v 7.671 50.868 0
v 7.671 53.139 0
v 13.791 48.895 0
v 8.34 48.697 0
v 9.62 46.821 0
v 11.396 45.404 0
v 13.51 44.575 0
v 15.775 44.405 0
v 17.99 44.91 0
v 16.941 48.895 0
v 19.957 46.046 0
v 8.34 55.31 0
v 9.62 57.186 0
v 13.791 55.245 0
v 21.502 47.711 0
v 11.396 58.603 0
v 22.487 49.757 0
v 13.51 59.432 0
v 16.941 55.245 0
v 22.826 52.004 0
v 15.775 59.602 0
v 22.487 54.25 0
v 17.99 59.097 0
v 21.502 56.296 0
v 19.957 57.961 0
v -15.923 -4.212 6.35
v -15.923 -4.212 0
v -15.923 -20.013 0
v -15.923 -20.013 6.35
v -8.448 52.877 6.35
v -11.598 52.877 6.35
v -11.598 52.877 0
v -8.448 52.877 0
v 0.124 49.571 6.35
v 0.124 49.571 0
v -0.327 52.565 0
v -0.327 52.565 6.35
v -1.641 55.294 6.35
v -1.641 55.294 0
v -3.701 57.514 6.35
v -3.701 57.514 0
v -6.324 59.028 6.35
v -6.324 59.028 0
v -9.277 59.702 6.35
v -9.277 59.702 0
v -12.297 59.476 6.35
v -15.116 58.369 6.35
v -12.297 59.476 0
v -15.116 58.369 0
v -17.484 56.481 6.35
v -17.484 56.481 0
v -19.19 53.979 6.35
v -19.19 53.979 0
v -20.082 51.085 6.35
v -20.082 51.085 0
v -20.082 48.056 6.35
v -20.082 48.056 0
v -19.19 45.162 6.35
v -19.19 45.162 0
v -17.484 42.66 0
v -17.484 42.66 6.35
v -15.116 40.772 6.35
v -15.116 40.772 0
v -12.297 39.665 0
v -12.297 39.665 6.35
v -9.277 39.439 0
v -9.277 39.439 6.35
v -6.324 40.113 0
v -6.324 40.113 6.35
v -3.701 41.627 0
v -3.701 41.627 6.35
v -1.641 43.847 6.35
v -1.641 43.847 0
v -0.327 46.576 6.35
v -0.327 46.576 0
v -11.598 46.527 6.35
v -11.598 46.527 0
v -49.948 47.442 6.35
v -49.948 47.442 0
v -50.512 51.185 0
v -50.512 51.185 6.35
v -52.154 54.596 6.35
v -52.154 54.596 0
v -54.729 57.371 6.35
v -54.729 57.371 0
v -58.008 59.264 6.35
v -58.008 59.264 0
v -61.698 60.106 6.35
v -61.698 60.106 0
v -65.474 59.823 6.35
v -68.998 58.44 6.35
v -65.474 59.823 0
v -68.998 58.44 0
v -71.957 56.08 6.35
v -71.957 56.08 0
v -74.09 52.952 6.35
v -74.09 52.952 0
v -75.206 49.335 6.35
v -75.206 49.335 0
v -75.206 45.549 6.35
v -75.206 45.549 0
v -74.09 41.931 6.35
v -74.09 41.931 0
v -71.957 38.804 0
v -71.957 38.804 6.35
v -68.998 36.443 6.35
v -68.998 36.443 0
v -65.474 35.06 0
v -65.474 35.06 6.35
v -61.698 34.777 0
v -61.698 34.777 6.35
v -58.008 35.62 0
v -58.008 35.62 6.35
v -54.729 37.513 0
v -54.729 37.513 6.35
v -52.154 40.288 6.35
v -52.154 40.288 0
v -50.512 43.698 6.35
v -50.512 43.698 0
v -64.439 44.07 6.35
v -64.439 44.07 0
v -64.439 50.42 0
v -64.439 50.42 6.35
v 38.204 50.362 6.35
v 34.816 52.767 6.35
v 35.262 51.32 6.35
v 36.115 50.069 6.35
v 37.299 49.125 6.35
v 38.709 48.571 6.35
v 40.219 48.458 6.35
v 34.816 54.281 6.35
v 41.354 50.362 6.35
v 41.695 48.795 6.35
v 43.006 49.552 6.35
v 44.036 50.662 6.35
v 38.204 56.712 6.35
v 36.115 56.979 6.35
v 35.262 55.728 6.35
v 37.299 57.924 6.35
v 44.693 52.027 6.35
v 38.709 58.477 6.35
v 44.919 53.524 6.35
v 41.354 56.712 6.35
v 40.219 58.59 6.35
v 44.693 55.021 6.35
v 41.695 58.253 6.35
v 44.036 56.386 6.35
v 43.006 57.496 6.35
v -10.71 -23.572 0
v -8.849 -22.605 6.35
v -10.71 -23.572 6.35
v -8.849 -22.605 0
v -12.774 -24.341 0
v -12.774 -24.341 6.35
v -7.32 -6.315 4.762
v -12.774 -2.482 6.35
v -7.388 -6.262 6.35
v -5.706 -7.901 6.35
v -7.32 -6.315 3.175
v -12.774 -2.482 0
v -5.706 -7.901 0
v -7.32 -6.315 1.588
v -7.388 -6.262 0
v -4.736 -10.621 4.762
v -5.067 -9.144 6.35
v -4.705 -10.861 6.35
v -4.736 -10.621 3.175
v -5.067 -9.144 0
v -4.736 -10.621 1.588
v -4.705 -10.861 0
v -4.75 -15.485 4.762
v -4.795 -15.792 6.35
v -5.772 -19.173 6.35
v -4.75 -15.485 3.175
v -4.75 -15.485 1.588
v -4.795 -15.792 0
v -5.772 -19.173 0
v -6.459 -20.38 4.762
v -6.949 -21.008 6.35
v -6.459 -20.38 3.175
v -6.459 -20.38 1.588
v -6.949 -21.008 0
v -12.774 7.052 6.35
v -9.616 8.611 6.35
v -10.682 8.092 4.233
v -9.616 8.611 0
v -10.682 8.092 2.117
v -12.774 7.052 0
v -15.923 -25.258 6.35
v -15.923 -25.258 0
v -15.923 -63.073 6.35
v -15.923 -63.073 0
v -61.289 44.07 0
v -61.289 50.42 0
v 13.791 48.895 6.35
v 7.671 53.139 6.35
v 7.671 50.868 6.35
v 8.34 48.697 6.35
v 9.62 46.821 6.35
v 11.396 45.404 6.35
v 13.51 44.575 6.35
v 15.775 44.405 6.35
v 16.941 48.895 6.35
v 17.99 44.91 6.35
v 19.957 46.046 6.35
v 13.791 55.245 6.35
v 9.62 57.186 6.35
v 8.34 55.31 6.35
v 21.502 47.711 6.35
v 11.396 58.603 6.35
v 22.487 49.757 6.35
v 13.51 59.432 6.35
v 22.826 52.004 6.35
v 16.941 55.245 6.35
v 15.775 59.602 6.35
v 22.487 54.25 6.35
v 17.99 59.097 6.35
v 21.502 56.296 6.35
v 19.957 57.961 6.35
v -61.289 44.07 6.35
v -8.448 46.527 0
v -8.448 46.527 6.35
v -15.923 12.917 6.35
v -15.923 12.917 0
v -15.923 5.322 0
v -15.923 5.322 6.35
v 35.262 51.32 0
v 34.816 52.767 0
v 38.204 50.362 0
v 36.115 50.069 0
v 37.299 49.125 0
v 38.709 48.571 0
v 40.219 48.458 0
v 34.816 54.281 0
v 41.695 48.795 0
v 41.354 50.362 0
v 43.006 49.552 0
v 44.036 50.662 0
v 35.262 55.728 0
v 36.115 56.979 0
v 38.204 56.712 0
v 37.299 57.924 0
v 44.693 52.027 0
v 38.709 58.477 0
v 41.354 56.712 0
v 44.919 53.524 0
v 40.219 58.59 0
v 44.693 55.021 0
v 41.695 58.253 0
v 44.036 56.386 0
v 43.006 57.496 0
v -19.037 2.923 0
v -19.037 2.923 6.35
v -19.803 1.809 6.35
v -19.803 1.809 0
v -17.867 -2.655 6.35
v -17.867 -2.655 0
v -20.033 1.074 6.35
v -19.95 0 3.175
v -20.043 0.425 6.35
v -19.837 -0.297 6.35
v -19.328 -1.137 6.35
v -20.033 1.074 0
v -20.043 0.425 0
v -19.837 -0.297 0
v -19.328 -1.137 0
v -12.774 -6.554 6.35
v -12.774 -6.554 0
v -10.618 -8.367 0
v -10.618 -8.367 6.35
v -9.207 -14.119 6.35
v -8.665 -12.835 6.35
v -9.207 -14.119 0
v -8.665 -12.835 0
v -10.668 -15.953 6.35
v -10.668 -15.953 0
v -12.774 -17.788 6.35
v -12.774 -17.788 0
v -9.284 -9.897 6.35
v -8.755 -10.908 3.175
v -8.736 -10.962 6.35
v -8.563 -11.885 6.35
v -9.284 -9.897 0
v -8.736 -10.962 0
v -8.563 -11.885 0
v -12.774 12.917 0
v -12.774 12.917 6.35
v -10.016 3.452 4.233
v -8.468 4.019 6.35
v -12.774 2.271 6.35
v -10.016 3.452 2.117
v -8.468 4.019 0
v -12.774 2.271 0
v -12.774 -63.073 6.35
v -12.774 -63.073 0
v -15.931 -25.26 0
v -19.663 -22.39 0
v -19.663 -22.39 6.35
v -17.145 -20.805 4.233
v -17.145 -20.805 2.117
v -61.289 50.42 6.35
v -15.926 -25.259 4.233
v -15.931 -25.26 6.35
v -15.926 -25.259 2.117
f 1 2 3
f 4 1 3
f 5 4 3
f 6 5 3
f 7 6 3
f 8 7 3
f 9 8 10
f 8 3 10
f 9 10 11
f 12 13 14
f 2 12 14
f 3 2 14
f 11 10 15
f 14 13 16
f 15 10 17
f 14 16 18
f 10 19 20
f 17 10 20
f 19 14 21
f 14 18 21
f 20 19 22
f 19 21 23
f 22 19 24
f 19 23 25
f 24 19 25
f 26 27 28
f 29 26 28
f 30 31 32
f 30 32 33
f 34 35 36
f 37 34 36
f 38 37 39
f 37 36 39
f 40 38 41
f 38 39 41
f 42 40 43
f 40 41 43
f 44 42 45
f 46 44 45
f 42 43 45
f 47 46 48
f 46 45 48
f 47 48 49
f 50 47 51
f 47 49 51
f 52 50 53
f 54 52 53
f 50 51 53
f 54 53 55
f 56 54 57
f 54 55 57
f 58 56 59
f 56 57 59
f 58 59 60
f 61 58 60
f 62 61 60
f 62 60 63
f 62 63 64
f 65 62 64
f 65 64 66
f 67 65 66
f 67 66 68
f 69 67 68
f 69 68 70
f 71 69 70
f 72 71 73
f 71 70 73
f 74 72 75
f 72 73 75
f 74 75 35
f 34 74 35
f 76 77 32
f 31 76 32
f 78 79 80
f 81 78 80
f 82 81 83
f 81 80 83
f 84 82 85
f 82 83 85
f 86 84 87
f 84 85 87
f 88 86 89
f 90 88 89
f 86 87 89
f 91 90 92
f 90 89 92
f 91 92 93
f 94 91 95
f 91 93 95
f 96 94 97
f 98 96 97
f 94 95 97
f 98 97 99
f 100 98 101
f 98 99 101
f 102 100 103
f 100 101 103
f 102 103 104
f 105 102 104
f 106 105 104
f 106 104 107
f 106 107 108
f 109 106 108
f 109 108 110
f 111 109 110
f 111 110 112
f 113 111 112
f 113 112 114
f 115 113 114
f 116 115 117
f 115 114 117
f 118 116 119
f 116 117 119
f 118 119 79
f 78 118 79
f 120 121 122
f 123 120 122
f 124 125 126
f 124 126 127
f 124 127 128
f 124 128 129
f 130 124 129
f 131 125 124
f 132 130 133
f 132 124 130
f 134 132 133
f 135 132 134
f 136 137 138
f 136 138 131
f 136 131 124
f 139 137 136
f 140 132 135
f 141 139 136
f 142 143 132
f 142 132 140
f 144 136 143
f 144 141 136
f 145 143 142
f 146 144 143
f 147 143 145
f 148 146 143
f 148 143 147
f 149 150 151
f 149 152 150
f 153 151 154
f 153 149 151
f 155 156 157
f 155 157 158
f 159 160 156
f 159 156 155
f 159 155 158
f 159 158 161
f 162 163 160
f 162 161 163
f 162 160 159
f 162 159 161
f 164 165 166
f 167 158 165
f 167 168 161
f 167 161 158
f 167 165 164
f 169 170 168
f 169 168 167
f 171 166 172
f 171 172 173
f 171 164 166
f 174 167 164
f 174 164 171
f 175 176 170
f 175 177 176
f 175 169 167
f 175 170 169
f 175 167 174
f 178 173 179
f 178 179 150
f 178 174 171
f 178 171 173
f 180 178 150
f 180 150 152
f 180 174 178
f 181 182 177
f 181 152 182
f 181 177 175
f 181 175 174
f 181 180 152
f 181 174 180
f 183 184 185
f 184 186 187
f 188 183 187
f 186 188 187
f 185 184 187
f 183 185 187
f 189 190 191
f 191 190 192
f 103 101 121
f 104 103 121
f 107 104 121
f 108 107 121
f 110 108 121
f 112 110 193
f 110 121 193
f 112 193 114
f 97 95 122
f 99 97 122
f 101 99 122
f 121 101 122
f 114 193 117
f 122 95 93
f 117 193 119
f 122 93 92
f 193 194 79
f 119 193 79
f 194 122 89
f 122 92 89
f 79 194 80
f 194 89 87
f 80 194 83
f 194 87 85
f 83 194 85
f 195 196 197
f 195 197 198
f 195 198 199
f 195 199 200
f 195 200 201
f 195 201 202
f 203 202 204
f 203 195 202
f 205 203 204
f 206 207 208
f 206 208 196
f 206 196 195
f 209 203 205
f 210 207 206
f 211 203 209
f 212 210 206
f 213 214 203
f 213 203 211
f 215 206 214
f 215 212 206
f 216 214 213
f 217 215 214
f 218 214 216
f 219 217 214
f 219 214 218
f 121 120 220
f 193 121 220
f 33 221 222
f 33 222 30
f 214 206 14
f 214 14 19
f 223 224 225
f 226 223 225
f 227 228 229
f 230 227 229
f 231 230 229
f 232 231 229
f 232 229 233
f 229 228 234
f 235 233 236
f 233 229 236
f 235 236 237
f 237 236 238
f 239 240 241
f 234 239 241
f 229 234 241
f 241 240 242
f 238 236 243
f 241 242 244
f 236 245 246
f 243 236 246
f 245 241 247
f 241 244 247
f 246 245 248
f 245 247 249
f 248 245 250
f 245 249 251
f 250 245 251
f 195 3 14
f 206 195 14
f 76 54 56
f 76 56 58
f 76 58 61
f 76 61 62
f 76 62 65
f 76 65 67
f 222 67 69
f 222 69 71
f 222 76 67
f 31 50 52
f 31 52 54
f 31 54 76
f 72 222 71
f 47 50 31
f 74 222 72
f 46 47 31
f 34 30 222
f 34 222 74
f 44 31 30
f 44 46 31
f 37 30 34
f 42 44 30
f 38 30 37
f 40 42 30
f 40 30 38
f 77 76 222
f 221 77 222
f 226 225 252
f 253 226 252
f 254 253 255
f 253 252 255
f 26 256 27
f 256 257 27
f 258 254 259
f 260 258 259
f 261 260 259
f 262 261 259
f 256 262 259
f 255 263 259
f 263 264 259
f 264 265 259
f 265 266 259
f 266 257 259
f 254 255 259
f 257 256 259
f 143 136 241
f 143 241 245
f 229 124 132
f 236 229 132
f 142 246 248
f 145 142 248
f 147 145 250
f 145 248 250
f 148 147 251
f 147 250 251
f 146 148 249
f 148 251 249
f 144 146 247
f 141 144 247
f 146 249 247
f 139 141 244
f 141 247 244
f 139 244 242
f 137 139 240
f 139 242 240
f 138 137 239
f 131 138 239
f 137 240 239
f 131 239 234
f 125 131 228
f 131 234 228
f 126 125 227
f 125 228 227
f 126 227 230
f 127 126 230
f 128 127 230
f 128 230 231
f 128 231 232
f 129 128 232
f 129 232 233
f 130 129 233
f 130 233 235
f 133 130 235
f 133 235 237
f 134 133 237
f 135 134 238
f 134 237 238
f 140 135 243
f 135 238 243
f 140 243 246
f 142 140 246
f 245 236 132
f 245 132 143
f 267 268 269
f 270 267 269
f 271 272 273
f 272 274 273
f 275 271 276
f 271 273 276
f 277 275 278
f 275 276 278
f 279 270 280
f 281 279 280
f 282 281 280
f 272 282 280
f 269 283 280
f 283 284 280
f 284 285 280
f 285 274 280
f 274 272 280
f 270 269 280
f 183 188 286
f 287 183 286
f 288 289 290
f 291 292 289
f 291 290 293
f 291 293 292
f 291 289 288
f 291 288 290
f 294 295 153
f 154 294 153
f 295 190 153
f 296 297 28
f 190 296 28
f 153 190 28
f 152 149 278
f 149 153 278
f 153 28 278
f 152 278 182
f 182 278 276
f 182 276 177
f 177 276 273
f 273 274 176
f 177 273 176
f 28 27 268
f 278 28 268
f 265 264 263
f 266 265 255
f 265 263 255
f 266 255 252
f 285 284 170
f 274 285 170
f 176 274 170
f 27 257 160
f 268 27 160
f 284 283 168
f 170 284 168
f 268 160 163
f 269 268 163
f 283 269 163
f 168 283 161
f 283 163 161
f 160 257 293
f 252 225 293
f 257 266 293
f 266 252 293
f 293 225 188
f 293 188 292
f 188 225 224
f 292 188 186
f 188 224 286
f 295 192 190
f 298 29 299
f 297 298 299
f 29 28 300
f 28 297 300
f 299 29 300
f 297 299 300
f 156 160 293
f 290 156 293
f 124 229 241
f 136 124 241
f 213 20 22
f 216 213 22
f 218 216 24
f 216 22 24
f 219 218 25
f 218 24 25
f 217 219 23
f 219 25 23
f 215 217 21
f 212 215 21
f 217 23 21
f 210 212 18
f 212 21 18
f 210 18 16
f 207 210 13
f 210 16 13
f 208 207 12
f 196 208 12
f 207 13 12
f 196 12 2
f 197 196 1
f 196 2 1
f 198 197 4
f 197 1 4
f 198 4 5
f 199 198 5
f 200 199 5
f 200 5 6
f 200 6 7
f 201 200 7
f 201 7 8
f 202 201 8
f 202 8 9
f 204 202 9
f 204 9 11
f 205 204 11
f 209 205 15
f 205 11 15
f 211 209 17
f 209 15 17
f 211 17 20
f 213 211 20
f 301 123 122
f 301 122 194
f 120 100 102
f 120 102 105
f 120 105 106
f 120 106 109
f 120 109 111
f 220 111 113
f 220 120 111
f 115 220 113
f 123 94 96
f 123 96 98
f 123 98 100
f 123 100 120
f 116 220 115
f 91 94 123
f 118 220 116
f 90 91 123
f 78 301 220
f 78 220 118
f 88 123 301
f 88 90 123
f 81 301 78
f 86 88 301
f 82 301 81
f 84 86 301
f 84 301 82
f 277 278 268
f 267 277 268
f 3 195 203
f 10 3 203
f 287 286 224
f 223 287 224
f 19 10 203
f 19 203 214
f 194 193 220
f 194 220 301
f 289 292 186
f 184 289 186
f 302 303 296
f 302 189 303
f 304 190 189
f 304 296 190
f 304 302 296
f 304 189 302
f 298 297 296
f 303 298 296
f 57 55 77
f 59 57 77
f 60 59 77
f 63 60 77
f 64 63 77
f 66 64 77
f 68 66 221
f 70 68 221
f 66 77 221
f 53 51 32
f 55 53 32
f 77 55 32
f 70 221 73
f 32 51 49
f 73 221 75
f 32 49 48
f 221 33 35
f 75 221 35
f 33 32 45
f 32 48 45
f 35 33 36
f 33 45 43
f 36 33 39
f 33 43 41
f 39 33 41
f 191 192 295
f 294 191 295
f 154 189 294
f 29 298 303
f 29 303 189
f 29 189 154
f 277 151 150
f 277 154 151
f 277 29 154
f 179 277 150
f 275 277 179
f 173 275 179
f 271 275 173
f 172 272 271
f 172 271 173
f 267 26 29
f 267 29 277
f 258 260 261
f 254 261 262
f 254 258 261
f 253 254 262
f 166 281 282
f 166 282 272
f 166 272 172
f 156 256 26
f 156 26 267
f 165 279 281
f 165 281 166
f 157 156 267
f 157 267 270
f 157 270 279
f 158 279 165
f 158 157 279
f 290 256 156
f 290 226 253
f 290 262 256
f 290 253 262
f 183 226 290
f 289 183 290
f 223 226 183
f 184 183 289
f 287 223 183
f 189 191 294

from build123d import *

# Parameters (mm, degrees)
F0_R     = 12.7
F1_DEPTH = 6.35
F0_R_2   = 10.16
F0_R_3   = 7.62
F0_R_4   = 5.08
F3_DEPTH = 6.35
F6_W     = 3.1496
F6_H     = 6.35
F5_W     = 3.1496
F5_H     = 6.35
F4_W     = 3.1496
F4_H     = 6.35
F8_DEPTH = 25.4
F7_W     = 3.1496
F7_H     = 6.35
F9_DEPTH = 6.35


with BuildPart() as f1:
    # F0 (on Top) → F1 (new body)
    with BuildSketch(Plane.XY):
        with Locations((-62.6475140452, 47.4418066442)):
            Circle(F0_R)
    extrude(amount=F1_DEPTH)

    # F7 (on face) → F9 (cut)
    with BuildSketch(Plane.XY.offset(6.35)):
        with Locations((-62.8639711767, 47.2454865665)):
            Rectangle(F7_W, F7_H)
    extrude(amount=-F9_DEPTH, mode=Mode.SUBTRACT)


with BuildPart() as f1b:
    # F0 (on Top) → F1, piece 2 (new body)
    with BuildSketch(Plane.XY):
        with Locations((-10.0357653573, 49.5706051588)):
            Circle(F0_R_2)
    extrude(amount=F1_DEPTH)


with BuildPart() as f1c:
    # F0 (on Top) → F1, piece 3 (new body)
    with BuildSketch(Plane.XY):
        with Locations((15.205710195, 52.0035177469)):
            Circle(F0_R_3)
    extrude(amount=F1_DEPTH)


with BuildPart() as f1d:
    # F0 (on Top) → F1, piece 4 (new body)
    with BuildSketch(Plane.XY):
        with Locations((39.8389585316, 53.5240918398)):
            Circle(F0_R_4)
    extrude(amount=F1_DEPTH)


with BuildPart() as f3:
    # F2 (on Top) → F3 (new body)
    with BuildSketch(Plane.XY):
        with BuildLine():
            Line((-8.4678437561, 4.0186406113), (-9.6160257235, 8.6113698781))
            add(Edge.make_bspline(
                [(-9.6160257235, 8.6113698781), (-10.6833861015, 8.0923795797), (-11.7507464795, 7.5733892813), (-12.7735268325, 7.0519943274)],
                knots=[0, 0, 0, 0, 0.0596427417, 0.0596427417, 0.0596427417, 0.0596427417], degree=3))
            Line((-12.7735268325, 7.0519943274), (-12.7735268325, 2.2706629447))
            add(Edge.make_bspline(
                [(-8.4678437561, 4.0186406113), (-10.0301890443, 3.4535009748), (-11.5925343326, 2.8883613382), (-12.7735268325, 2.2706629447)],
                knots=[0, 0, 0, 0, 0.0902645739, 0.0902645739, 0.0902645739, 0.0902645739], degree=3))
        make_face()
        with BuildLine():
            Line((-12.7735268325, 2.2706629447), (-12.7735268325, 7.0519943274))
            add(Edge.make_bspline(
                [(-12.7735268325, 7.0519943274), (-13.8968574684, 6.4793406551), (-14.9664118237, 5.9037862795), (-15.9231268325, 5.322145327)],
                knots=[0.0596427417, 0.0596427417, 0.0596427417, 0.0596427417, 0.1251490049, 0.1251490049, 0.1251490049, 0.1251490049], degree=3))
            Line((-15.9231268325, 5.322145327), (-15.9231268325, -4.2120677647))
            add(Edge.make_bspline(
                [(-15.9231268325, -4.2120677647), (-14.8990467489, -4.9823459072), (-13.8006787573, -5.7642644238), (-12.7735268325, -6.5540185516)],
                knots=[0.4529671461, 0.4529671461, 0.4529671461, 0.4529671461, 0.5254439167, 0.5254439167, 0.5254439167, 0.5254439167], degree=3))
            Line((-12.7735268325, -6.5540185516), (-12.7735268325, -2.4823222257))
            add(Edge.make_bspline(
                [(-12.7735268325, 2.2706629447), (-14.0585239476, 1.5985666749), (-15.6198144692, 0.2230887267), (-13.8734685755, -1.6082538799), (-12.7735268325, -2.4823222257)],
                knots=[0.0902645739, 0.0902645739, 0.0902645739, 0.0902645739, 0.1884783365, 0.2742319031, 0.2742319031, 0.2742319031, 0.2742319031], degree=3))
        make_face()
        with BuildLine():
            add(Edge.make_bspline(
                [(-12.7735268325, 7.0519943274), (-13.8968574684, 6.4793406551), (-14.9664118237, 5.9037862795), (-15.9231268325, 5.322145327)],
                knots=[0.0596427417, 0.0596427417, 0.0596427417, 0.0596427417, 0.1251490049, 0.1251490049, 0.1251490049, 0.1251490049], degree=3))
            Line((-12.7735268325, 7.0519943274), (-12.7735268325, 12.9170520231))
            Line((-12.7735268325, 12.9170520231), (-15.9231268325, 12.9170520231))
            Line((-15.9231268325, 12.9170520231), (-15.9231268325, 5.322145327))
        make_face()
        with BuildLine():
            Line((-15.9231268325, -4.2120677647), (-15.9231268325, 5.322145327))
            add(Edge.make_bspline(
                [(-15.9231268325, 5.322145327), (-18.7127559793, 3.6261726085), (-21.8539712965, 0.626605904), (-17.8562527538, -2.7580363192), (-15.9231268325, -4.2120677647)],
                knots=[0.1251490049, 0.1251490049, 0.1251490049, 0.1251490049, 0.3161548732, 0.4529671461, 0.4529671461, 0.4529671461, 0.4529671461], degree=3))
        make_face()
        with BuildLine():
            Line((-12.7735268325, -2.4823222257), (-12.7735268325, 2.2706629447))
            add(Edge.make_bspline(
                [(-12.7735268325, 2.2706629447), (-14.0585239476, 1.5985666749), (-15.6198144692, 0.2230887267), (-13.8734685755, -1.6082538799), (-12.7735268325, -2.4823222257)],
                knots=[0.0902645739, 0.0902645739, 0.0902645739, 0.0902645739, 0.1884783365, 0.2742319031, 0.2742319031, 0.2742319031, 0.2742319031], degree=3))
        make_face()
        with BuildLine():
            add(Edge.make_bspline(
                [(-15.9231268325, -4.2120677647), (-14.8990467489, -4.9823459072), (-13.8006787573, -5.7642644238), (-12.7735268325, -6.5540185516)],
                knots=[0.4529671461, 0.4529671461, 0.4529671461, 0.4529671461, 0.5254439167, 0.5254439167, 0.5254439167, 0.5254439167], degree=3))
            Line((-15.9231268325, -4.2120677647), (-15.9231268325, -20.0129056802))
            add(Edge.make_bspline(
                [(-12.7735268325, -17.7878302714), (-13.7289668672, -18.5292595993), (-14.7969822386, -19.2710018497), (-15.9231268325, -20.0129056802)],
                knots=[0.8627224699, 0.8627224699, 0.8627224699, 0.8627224699, 0.9291155922, 0.9291155922, 0.9291155922, 0.9291155922], degree=3))
            Line((-12.7735268325, -17.7878302714), (-12.7735268325, -6.5540185516))
        make_face()
        with BuildLine():
            add(Edge.make_bspline(
                [(-12.7735268325, -2.4823222257), (-11.1105625055, -3.8037962834), (-6.0358747691, -6.8009672669), (-4.2131061277, -10.181759533), (-4.7281423763, -20.9130313984), (-10.1853378038, -23.4981717336), (-12.7735268325, -24.3405292915)],
                knots=[0.2742319031, 0.2742319031, 0.2742319031, 0.2742319031, 0.4038797896, 0.5582503774, 0.7751222544, 0.9362031982, 0.9362031982, 0.9362031982, 0.9362031982], degree=3))
            Line((-12.7735268325, -2.4823222257), (-12.7735268325, -6.5540185516))
            add(Edge.make_bspline(
                [(-12.7735268325, -6.5540185516), (-10.9097520325, -7.9870332847), (-6.7311376186, -11.7284041807), (-9.8123788727, -15.4899550915), (-12.7735268325, -17.7878302714)],
                knots=[0.5254439167, 0.5254439167, 0.5254439167, 0.5254439167, 0.6569535555, 0.8627224699, 0.8627224699, 0.8627224699, 0.8627224699], degree=3))
            Line((-12.7735268325, -17.7878302714), (-12.7735268325, -24.3405292915))
        make_face()
        with BuildLine():
            Line((-15.9231268325, -25.2578346846), (-15.9231268325, -20.0129056802))
            add(Edge.make_bspline(
                [(-15.9231268325, -20.0129056802), (-17.1254515585, -20.8049969664), (-18.3940360291, -21.5972724329), (-19.6626204997, -22.3895478994)],
                knots=[0.9291155922, 0.9291155922, 0.9291155922, 0.9291155922, 1, 1, 1, 1], degree=3))
            Line((-19.6626204997, -22.3895478994), (-15.9310270101, -25.2600051463))
            add(Edge.make_bspline(
                [(-15.9231268325, -25.2578346846), (-15.9257602246, -25.2585581722), (-15.9283936173, -25.2592816593), (-15.9310270101, -25.2600051463)],
                knots=[0.9998424319, 0.9998424319, 0.9998424319, 0.9998424319, 1, 1, 1, 1], degree=3))
        make_face()
        with BuildLine():
            add(Edge.make_bspline(
                [(-12.7735268325, -17.7878302714), (-13.7289668672, -18.5292595993), (-14.7969822386, -19.2710018497), (-15.9231268325, -20.0129056802)],
                knots=[0.8627224699, 0.8627224699, 0.8627224699, 0.8627224699, 0.9291155922, 0.9291155922, 0.9291155922, 0.9291155922], degree=3))
            Line((-15.9231268325, -20.0129056802), (-15.9231268325, -25.2578346846))
            add(Edge.make_bspline(
                [(-12.7735268325, -24.3405292915), (-13.7960585026, -24.6733246441), (-14.8595420951, -24.9656296668), (-15.9231268325, -25.2578346846)],
                knots=[0.9362031982, 0.9362031982, 0.9362031982, 0.9362031982, 0.9998424319, 0.9998424319, 0.9998424319, 0.9998424319], degree=3))
            Line((-12.7735268325, -24.3405292915), (-12.7735268325, -17.7878302714))
        make_face()
        with BuildLine():
            Line((-12.7735268325, -37.6726218224), (-12.7735268325, -24.3405292915))
            add(Edge.make_bspline(
                [(-12.7735268325, -24.3405292915), (-13.7960585026, -24.6733246441), (-14.8595420951, -24.9656296668), (-15.9231268325, -25.2578346846)],
                knots=[0.9362031982, 0.9362031982, 0.9362031982, 0.9362031982, 0.9998424319, 0.9998424319, 0.9998424319, 0.9998424319], degree=3))
            Line((-15.9231268325, -25.2578346846), (-15.9231268325, -63.0726218224))
            Line((-15.9231268325, -63.0726218224), (-12.7735268325, -63.0726218224))
            Line((-12.7735268325, -63.0726218224), (-12.7735268325, -37.6726218224))
        make_face()
    extrude(amount=F3_DEPTH)


with BuildPart() as f8_tool:
    # F6 (on face) + F5 (on face) + F4 (on face) → F8 (new body)
    with BuildSketch(Plane.XY.offset(6.35)):
        with Locations((-10.0231879159, 49.702028671)):
            Rectangle(F6_W, F6_H)
    with BuildSketch(Plane.XY.offset(6.35)):
        with Locations((15.3658976079, 52.0696741731)):
            Rectangle(F5_W, F5_H)
    with BuildSketch(Plane.XY.offset(6.35)):
        with Locations((39.7791160498, 53.5365851676)):
            Rectangle(F4_W, F4_H)
    extrude(amount=-F8_DEPTH)


with BuildPart() as f1b_1:
    add(f1b.part)

    # F8: cut by f8_tool
    add(f8_tool.part, mode=Mode.SUBTRACT)


with BuildPart() as f1c_1:
    add(f1c.part)

    # F8: cut by f8_tool
    add(f8_tool.part, mode=Mode.SUBTRACT)


with BuildPart() as f1d_1:
    add(f1d.part)

    # F8: cut by f8_tool
    add(f8_tool.part, mode=Mode.SUBTRACT)


solid = Compound([f1.part, f3.part, f1b_1.part, f1c_1.part, f1d_1.part])
